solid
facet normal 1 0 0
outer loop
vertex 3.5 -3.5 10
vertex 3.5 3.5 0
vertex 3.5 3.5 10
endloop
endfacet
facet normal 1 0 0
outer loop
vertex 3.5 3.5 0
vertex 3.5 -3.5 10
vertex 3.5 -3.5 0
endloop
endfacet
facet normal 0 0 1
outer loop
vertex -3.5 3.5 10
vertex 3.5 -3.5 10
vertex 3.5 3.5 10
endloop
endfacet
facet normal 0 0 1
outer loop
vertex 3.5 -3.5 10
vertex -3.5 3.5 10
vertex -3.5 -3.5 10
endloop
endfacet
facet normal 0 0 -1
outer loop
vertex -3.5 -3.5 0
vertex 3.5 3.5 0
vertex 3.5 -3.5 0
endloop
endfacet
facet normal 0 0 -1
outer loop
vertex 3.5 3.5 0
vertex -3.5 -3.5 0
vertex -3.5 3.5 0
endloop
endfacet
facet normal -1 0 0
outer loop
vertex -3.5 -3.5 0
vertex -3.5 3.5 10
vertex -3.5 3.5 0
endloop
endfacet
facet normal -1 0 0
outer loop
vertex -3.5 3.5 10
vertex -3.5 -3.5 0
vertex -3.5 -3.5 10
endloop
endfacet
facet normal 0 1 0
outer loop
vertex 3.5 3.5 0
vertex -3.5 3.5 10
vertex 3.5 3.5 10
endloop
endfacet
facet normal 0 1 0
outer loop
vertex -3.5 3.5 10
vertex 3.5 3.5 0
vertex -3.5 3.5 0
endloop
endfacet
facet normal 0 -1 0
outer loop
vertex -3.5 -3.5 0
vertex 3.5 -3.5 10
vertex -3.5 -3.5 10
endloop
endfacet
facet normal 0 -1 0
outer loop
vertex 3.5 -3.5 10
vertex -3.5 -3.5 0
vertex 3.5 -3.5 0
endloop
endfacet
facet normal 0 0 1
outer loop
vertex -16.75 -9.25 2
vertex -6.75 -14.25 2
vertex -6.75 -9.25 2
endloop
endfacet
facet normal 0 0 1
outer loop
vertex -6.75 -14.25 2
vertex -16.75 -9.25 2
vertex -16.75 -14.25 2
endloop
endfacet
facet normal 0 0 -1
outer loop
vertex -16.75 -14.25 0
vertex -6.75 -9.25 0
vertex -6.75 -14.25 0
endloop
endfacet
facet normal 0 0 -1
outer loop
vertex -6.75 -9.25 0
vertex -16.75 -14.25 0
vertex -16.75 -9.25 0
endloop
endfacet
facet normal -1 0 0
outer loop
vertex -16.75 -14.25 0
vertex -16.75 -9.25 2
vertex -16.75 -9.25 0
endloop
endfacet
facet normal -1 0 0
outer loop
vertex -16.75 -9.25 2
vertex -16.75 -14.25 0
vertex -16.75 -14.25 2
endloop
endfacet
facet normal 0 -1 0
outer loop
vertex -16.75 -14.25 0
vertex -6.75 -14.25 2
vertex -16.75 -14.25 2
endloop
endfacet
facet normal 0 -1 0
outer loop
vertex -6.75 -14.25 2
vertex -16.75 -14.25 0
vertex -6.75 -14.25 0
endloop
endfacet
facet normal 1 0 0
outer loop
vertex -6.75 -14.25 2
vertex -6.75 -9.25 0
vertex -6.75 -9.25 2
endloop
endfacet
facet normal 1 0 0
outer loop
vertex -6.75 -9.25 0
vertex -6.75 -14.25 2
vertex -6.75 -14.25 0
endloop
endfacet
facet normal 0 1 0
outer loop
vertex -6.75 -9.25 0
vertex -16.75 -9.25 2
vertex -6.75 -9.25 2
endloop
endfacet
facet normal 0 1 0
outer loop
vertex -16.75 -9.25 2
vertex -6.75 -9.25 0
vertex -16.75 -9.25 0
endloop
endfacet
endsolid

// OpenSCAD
translate([0, 0, 5]) color([0,1,0,0.9]) cube([7, 7, 10], center=true);
translate([-16.5, -14, 1]) color([1,0,0]) cube([0.5, 0.5, 2], center=true);
translate([-16, -14, 1]) color([1,0,0]) cube([0.5, 0.5, 2], center=true);
translate([-15.5, -14, 1]) color([1,0,0]) cube([0.5, 0.5, 2], center=true);
translate([-15, -14, 1]) color([1,0,0]) cube([0.5, 0.5, 2], center=true);
translate([-14.5, -14, 1]) color([1,0,0]) cube([0.5, 0.5, 2], center=true);
translate([-14, -14, 1]) color([1,0,0]) cube([0.5, 0.5, 2], center=true);
translate([-13.5, -14, 1]) color([1,0,0]) cube([0.5, 0.5, 2], center=true);
translate([-13, -14, 1]) color([1,0,0]) cube([0.5, 0.5, 2], center=true);
translate([-12.5, -14, 1]) color([1,0,0]) cube([0.5, 0.5, 2], center=true);
translate([-12, -14, 1]) color([1,0,0]) cube([0.5, 0.5, 2], center=true);
translate([-11.5, -14, 1]) color([1,0,0]) cube([0.5, 0.5, 2], center=true);
translate([-11, -14, 1]) color([1,0,0]) cube([0.5, 0.5, 2], center=true);
translate([-10.5, -14, 1]) color([1,0,0]) cube([0.5, 0.5, 2], center=true);
translate([-10, -14, 1]) color([1,0,0]) cube([0.5, 0.5, 2], center=true);
translate([-9.5, -14, 1]) color([1,0,0]) cube([0.5, 0.5, 2], center=true);
translate([-9, -14, 1]) color([1,0,0]) cube([0.5, 0.5, 2], center=true);
translate([-8.5, -14, 1]) color([1,0,0]) cube([0.5, 0.5, 2], center=true);
translate([-8, -14, 1]) color([1,0,0]) cube([0.5, 0.5, 2], center=true);
translate([-7.5, -14, 1]) color([1,0,0]) cube([0.5, 0.5, 2], center=true);
translate([-7, -14, 1]) color([1,0,0]) cube([0.5, 0.5, 2], center=true);
translate([-16.5, -13.5, 1]) color([1,0,0]) cube([0.5, 0.5, 2], center=true);
translate([-16, -13.5, 1]) color([1,0,0]) cube([0.5, 0.5, 2], center=true);
translate([-15.5, -13.5, 1]) color([1,0,0]) cube([0.5, 0.5, 2], center=true);
translate([-15, -13.5, 1]) color([1,0,0]) cube([0.5, 0.5, 2], center=true);
translate([-14.5, -13.5, 1]) color([1,0,0]) cube([0.5, 0.5, 2], center=true);
translate([-14, -13.5, 1]) color([1,0,0]) cube([0.5, 0.5, 2], center=true);
translate([-13.5, -13.5, 1]) color([1,0,0]) cube([0.5, 0.5, 2], center=true);
translate([-13, -13.5, 1]) color([1,0,0]) cube([0.5, 0.5, 2], center=true);
translate([-12.5, -13.5, 1]) color([1,0,0]) cube([0.5, 0.5, 2], center=true);
translate([-12, -13.5, 1]) color([1,0,0]) cube([0.5, 0.5, 2], center=true);
translate([-11.5, -13.5, 1]) color([1,0,0]) cube([0.5, 0.5, 2], center=true);
translate([-11, -13.5, 1]) color([1,0,0]) cube([0.5, 0.5, 2], center=true);
translate([-10.5, -13.5, 1]) color([1,0,0]) cube([0.5, 0.5, 2], center=true);
translate([-10, -13.5, 1]) color([1,0,0]) cube([0.5, 0.5, 2], center=true);
translate([-9.5, -13.5, 1]) color([1,0,0]) cube([0.5, 0.5, 2], center=true);
translate([-9, -13.5, 1]) color([1,0,0]) cube([0.5, 0.5, 2], center=true);
translate([-8.5, -13.5, 1]) color([1,0,0]) cube([0.5, 0.5, 2], center=true);
translate([-8, -13.5, 1]) color([1,0,0]) cube([0.5, 0.5, 2], center=true);
translate([-7.5, -13.5, 1]) color([1,0,0]) cube([0.5, 0.5, 2], center=true);
translate([-7, -13.5, 1]) color([1,0,0]) cube([0.5, 0.5, 2], center=true);
translate([-16.5, -13, 1]) color([1,0,0]) cube([0.5, 0.5, 2], center=true);
translate([-16, -13, 1]) color([1,0,0]) cube([0.5, 0.5, 2], center=true);
translate([-15.5, -13, 1]) color([1,0,0]) cube([0.5, 0.5, 2], center=true);
translate([-15, -13, 1]) color([1,0,0]) cube([0.5, 0.5, 2], center=true);
translate([-14.5, -13, 1]) color([1,0,0]) cube([0.5, 0.5, 2], center=true);
translate([-14, -13, 1]) color([1,0,0]) cube([0.5, 0.5, 2], center=true);
translate([-13.5, -13, 1]) color([1,0,0]) cube([0.5, 0.5, 2], center=true);
translate([-13, -13, 1]) color([1,0,0]) cube([0.5, 0.5, 2], center=true);
translate([-12.5, -13, 1]) color([1,0,0]) cube([0.5, 0.5, 2], center=true);
translate([-12, -13, 1]) color([1,0,0]) cube([0.5, 0.5, 2], center=true);
translate([-11.5, -13, 1]) color([1,0,0]) cube([0.5, 0.5, 2], center=true);
translate([-11, -13, 1]) color([1,0,0]) cube([0.5, 0.5, 2], center=true);
translate([-10.5, -13, 1]) color([1,0,0]) cube([0.5, 0.5, 2], center=true);
translate([-10, -13, 1]) color([1,0,0]) cube([0.5, 0.5, 2], center=true);
translate([-9.5, -13, 1]) color([1,0,0]) cube([0.5, 0.5, 2], center=true);
translate([-9, -13, 1]) color([1,0,0]) cube([0.5, 0.5, 2], center=true);
translate([-8.5, -13, 1]) color([1,0,0]) cube([0.5, 0.5, 2], center=true);
translate([-8, -13, 1]) color([1,0,0]) cube([0.5, 0.5, 2], center=true);
translate([-7.5, -13, 1]) color([1,0,0]) cube([0.5, 0.5, 2], center=true);
translate([-7, -13, 1]) color([1,0,0]) cube([0.5, 0.5, 2], center=true);
translate([-16.5, -12.5, 1]) color([1,0,0]) cube([0.5, 0.5, 2], center=true);
translate([-16, -12.5, 1]) color([1,0,0]) cube([0.5, 0.5, 2], center=true);
translate([-15.5, -12.5, 1]) color([1,0,0]) cube([0.5, 0.5, 2], center=true);
translate([-15, -12.5, 1]) color([1,0,0]) cube([0.5, 0.5, 2], center=true);
translate([-14.5, -12.5, 1]) color([1,0,0]) cube([0.5, 0.5, 2], center=true);
translate([-14, -12.5, 1]) color([1,0,0]) cube([0.5, 0.5, 2], center=true);
translate([-13.5, -12.5, 1]) color([1,0,0]) cube([0.5, 0.5, 2], center=true);
translate([-13, -12.5, 1]) color([1,0,0]) cube([0.5, 0.5, 2], center=true);
translate([-12.5, -12.5, 1]) color([1,0,0]) cube([0.5, 0.5, 2], center=true);
translate([-12, -12.5, 1]) color([1,0,0]) cube([0.5, 0.5, 2], center=true);
translate([-11.5, -12.5, 1]) color([1,0,0]) cube([0.5, 0.5, 2], center=true);
translate([-11, -12.5, 1]) color([1,0,0]) cube([0.5, 0.5, 2], center=true);
translate([-10.5, -12.5, 1]) color([1,0,0]) cube([0.5, 0.5, 2], center=true);
translate([-10, -12.5, 1]) color([1,0,0]) cube([0.5, 0.5, 2], center=true);
translate([-9.5, -12.5, 1]) color([1,0,0]) cube([0.5, 0.5, 2], center=true);
translate([-9, -12.5, 1]) color([1,0,0]) cube([0.5, 0.5, 2], center=true);
translate([-8.5, -12.5, 1]) color([1,0,0]) cube([0.5, 0.5, 2], center=true);
translate([-8, -12.5, 1]) color([1,0,0]) cube([0.5, 0.5, 2], center=true);
translate([-7.5, -12.5, 1]) color([1,0,0]) cube([0.5, 0.5, 2], center=true);
translate([-7, -12.5, 1]) color([1,0,0]) cube([0.5, 0.5, 2], center=true);
translate([-16.5, -12, 1]) color([1,0,0]) cube([0.5, 0.5, 2], center=true);
translate([-16, -12, 1]) color([1,0,0]) cube([0.5, 0.5, 2], center=true);
translate([-15.5, -12, 1]) color([1,0,0]) cube([0.5, 0.5, 2], center=true);
translate([-15, -12, 1]) color([1,0,0]) cube([0.5, 0.5, 2], center=true);
translate([-14.5, -12, 1]) color([1,0,0]) cube([0.5, 0.5, 2], center=true);
translate([-14, -12, 1]) color([1,0,0]) cube([0.5, 0.5, 2], center=true);
translate([-13.5, -12, 1]) color([1,0,0]) cube([0.5, 0.5, 2], center=true);
translate([-13, -12, 1]) color([1,0,0]) cube([0.5, 0.5, 2], center=true);
translate([-12.5, -12, 1]) color([1,0,0]) cube([0.5, 0.5, 2], center=true);
translate([-12, -12, 1]) color([1,0,0]) cube([0.5, 0.5, 2], center=true);
translate([-11.5, -12, 1]) color([1,0,0]) cube([0.5, 0.5, 2], center=true);
translate([-11, -12, 1]) color([1,0,0]) cube([0.5, 0.5, 2], center=true);
translate([-10.5, -12, 1]) color([1,0,0]) cube([0.5, 0.5, 2], center=true);
translate([-10, -12, 1]) color([1,0,0]) cube([0.5, 0.5, 2], center=true);
translate([-9.5, -12, 1]) color([1,0,0]) cube([0.5, 0.5, 2], center=true);
translate([-9, -12, 1]) color([1,0,0]) cube([0.5, 0.5, 2], center=true);
translate([-8.5, -12, 1]) color([1,0,0]) cube([0.5, 0.5, 2], center=true);
translate([-8, -12, 1]) color([1,0,0]) cube([0.5, 0.5, 2], center=true);
translate([-7.5, -12, 1]) color([1,0,0]) cube([0.5, 0.5, 2], center=true);
translate([-7, -12, 1]) color([1,0,0]) cube([0.5, 0.5, 2], center=true);
translate([-16.5, -11.5, 1]) color([1,0,0]) cube([0.5, 0.5, 2], center=true);
translate([-16, -11.5, 1]) color([1,0,0]) cube([0.5, 0.5, 2], center=true);
translate([-15.5, -11.5, 1]) color([1,0,0]) cube([0.5, 0.5, 2], center=true);
translate([-15, -11.5, 1]) color([1,0,0]) cube([0.5, 0.5, 2], center=true);
translate([-14.5, -11.5, 1]) color([1,0,0]) cube([0.5, 0.5, 2], center=true);
translate([-14, -11.5, 1]) color([1,0,0]) cube([0.5, 0.5, 2], center=true);
translate([-13.5, -11.5, 1]) color([1,0,0]) cube([0.5, 0.5, 2], center=true);
translate([-13, -11.5, 1]) color([1,0,0]) cube([0.5, 0.5, 2], center=true);
translate([-12.5, -11.5, 1]) color([1,0,0]) cube([0.5, 0.5, 2], center=true);
translate([-12, -11.5, 1]) color([1,0,0]) cube([0.5, 0.5, 2], center=true);
translate([-11.5, -11.5, 1]) color([1,0,0]) cube([0.5, 0.5, 2], center=true);
translate([-11, -11.5, 1]) color([1,0,0]) cube([0.5, 0.5, 2], center=true);
translate([-10.5, -11.5, 1]) color([1,0,0]) cube([0.5, 0.5, 2], center=true);
translate([-10, -11.5, 1]) color([1,0,0]) cube([0.5, 0.5, 2], center=true);
translate([-9.5, -11.5, 1]) color([1,0,0]) cube([0.5, 0.5, 2], center=true);
translate([-9, -11.5, 1]) color([1,0,0]) cube([0.5, 0.5, 2], center=true);
translate([-8.5, -11.5, 1]) color([1,0,0]) cube([0.5, 0.5, 2], center=true);
translate([-8, -11.5, 1]) color([1,0,0]) cube([0.5, 0.5, 2], center=true);
translate([-7.5, -11.5, 1]) color([1,0,0]) cube([0.5, 0.5, 2], center=true);
translate([-7, -11.5, 1]) color([1,0,0]) cube([0.5, 0.5, 2], center=true);
translate([-16.5, -11, 1]) color([1,0,0]) cube([0.5, 0.5, 2], center=true);
translate([-16, -11, 1]) color([1,0,0]) cube([0.5, 0.5, 2], center=true);
translate([-15.5, -11, 1]) color([1,0,0]) cube([0.5, 0.5, 2], center=true);
translate([-15, -11, 1]) color([1,0,0]) cube([0.5, 0.5, 2], center=true);
translate([-14.5, -11, 1]) color([1,0,0]) cube([0.5, 0.5, 2], center=true);
translate([-14, -11, 1]) color([1,0,0]) cube([0.5, 0.5, 2], center=true);
translate([-13.5, -11, 1]) color([1,0,0]) cube([0.5, 0.5, 2], center=true);
translate([-13, -11, 1]) color([1,0,0]) cube([0.5, 0.5, 2], center=true);
translate([-12.5, -11, 1]) color([1,0,0]) cube([0.5, 0.5, 2], center=true);
translate([-12, -11, 1]) color([1,0,0]) cube([0.5, 0.5, 2], center=true);
translate([-11.5, -11, 1]) color([1,0,0]) cube([0.5, 0.5, 2], center=true);
translate([-11, -11, 1]) color([1,0,0]) cube([0.5, 0.5, 2], center=true);
translate([-10.5, -11, 1]) color([1,0,0]) cube([0.5, 0.5, 2], center=true);
translate([-10, -11, 1]) color([1,0,0]) cube([0.5, 0.5, 2], center=true);
translate([-9.5, -11, 1]) color([1,0,0]) cube([0.5, 0.5, 2], center=true);
translate([-9, -11, 1]) color([1,0,0]) cube([0.5, 0.5, 2], center=true);
translate([-8.5, -11, 1]) color([1,0,0]) cube([0.5, 0.5, 2], center=true);
translate([-8, -11, 1]) color([1,0,0]) cube([0.5, 0.5, 2], center=true);
translate([-7.5, -11, 1]) color([1,0,0]) cube([0.5, 0.5, 2], center=true);
translate([-7, -11, 1]) color([1,0,0]) cube([0.5, 0.5, 2], center=true);
translate([-16.5, -10.5, 1]) color([1,0,0]) cube([0.5, 0.5, 2], center=true);
translate([-16, -10.5, 1]) color([1,0,0]) cube([0.5, 0.5, 2], center=true);
translate([-15.5, -10.5, 1]) color([1,0,0]) cube([0.5, 0.5, 2], center=true);
translate([-15, -10.5, 1]) color([1,0,0]) cube([0.5, 0.5, 2], center=true);
translate([-14.5, -10.5, 1]) color([1,0,0]) cube([0.5, 0.5, 2], center=true);
translate([-14, -10.5, 1]) color([1,0,0]) cube([0.5, 0.5, 2], center=true);
translate([-13.5, -10.5, 1]) color([1,0,0]) cube([0.5, 0.5, 2], center=true);
translate([-13, -10.5, 1]) color([1,0,0]) cube([0.5, 0.5, 2], center=true);
translate([-12.5, -10.5, 1]) color([1,0,0]) cube([0.5, 0.5, 2], center=true);
translate([-12, -10.5, 1]) color([1,0,0]) cube([0.5, 0.5, 2], center=true);
translate([-11.5, -10.5, 1]) color([1,0,0]) cube([0.5, 0.5, 2], center=true);
translate([-11, -10.5, 1]) color([1,0,0]) cube([0.5, 0.5, 2], center=true);
translate([-10.5, -10.5, 1]) color([1,0,0]) cube([0.5, 0.5, 2], center=true);
translate([-10, -10.5, 1]) color([1,0,0]) cube([0.5, 0.5, 2], center=true);
translate([-9.5, -10.5, 1]) color([1,0,0]) cube([0.5, 0.5, 2], center=true);
translate([-9, -10.5, 1]) color([1,0,0]) cube([0.5, 0.5, 2], center=true);
translate([-8.5, -10.5, 1]) color([1,0,0]) cube([0.5, 0.5, 2], center=true);
translate([-8, -10.5, 1]) color([1,0,0]) cube([0.5, 0.5, 2], center=true);
translate([-7.5, -10.5, 1]) color([1,0,0]) cube([0.5, 0.5, 2], center=true);
translate([-7, -10.5, 1]) color([1,0,0]) cube([0.5, 0.5, 2], center=true);
translate([-16.5, -10, 1]) color([1,0,0]) cube([0.5, 0.5, 2], center=true);
translate([-16, -10, 1]) color([1,0,0]) cube([0.5, 0.5, 2], center=true);
translate([-15.5, -10, 1]) color([1,0,0]) cube([0.5, 0.5, 2], center=true);
translate([-15, -10, 1]) color([1,0,0]) cube([0.5, 0.5, 2], center=true);
translate([-14.5, -10, 1]) color([1,0,0]) cube([0.5, 0.5, 2], center=true);
translate([-14, -10, 1]) color([1,0,0]) cube([0.5, 0.5, 2], center=true);
translate([-13.5, -10, 1]) color([1,0,0]) cube([0.5, 0.5, 2], center=true);
translate([-13, -10, 1]) color([1,0,0]) cube([0.5, 0.5, 2], center=true);
translate([-12.5, -10, 1]) color([1,0,0]) cube([0.5, 0.5, 2], center=true);
translate([-12, -10, 1]) color([1,0,0]) cube([0.5, 0.5, 2], center=true);
translate([-11.5, -10, 1]) color([1,0,0]) cube([0.5, 0.5, 2], center=true);
translate([-11, -10, 1]) color([1,0,0]) cube([0.5, 0.5, 2], center=true);
translate([-10.5, -10, 1]) color([1,0,0]) cube([0.5, 0.5, 2], center=true);
translate([-10, -10, 1]) color([1,0,0]) cube([0.5, 0.5, 2], center=true);
translate([-9.5, -10, 1]) color([1,0,0]) cube([0.5, 0.5, 2], center=true);
translate([-9, -10, 1]) color([1,0,0]) cube([0.5, 0.5, 2], center=true);
translate([-8.5, -10, 1]) color([1,0,0]) cube([0.5, 0.5, 2], center=true);
translate([-8, -10, 1]) color([1,0,0]) cube([0.5, 0.5, 2], center=true);
translate([-7.5, -10, 1]) color([1,0,0]) cube([0.5, 0.5, 2], center=true);
translate([-7, -10, 1]) color([1,0,0]) cube([0.5, 0.5, 2], center=true);
translate([-16.5, -9.5, 1]) color([1,0,0]) cube([0.5, 0.5, 2], center=true);
translate([-16, -9.5, 1]) color([1,0,0]) cube([0.5, 0.5, 2], center=true);
translate([-15.5, -9.5, 1]) color([1,0,0]) cube([0.5, 0.5, 2], center=true);
translate([-15, -9.5, 1]) color([1,0,0]) cube([0.5, 0.5, 2], center=true);
translate([-14.5, -9.5, 1]) color([1,0,0]) cube([0.5, 0.5, 2], center=true);
translate([-14, -9.5, 1]) color([1,0,0]) cube([0.5, 0.5, 2], center=true);
translate([-13.5, -9.5, 1]) color([1,0,0]) cube([0.5, 0.5, 2], center=true);
translate([-13, -9.5, 1]) color([1,0,0]) cube([0.5, 0.5, 2], center=true);
translate([-12.5, -9.5, 1]) color([1,0,0]) cube([0.5, 0.5, 2], center=true);
translate([-12, -9.5, 1]) color([1,0,0]) cube([0.5, 0.5, 2], center=true);
translate([-11.5, -9.5, 1]) color([1,0,0]) cube([0.5, 0.5, 2], center=true);
translate([-11, -9.5, 1]) color([1,0,0]) cube([0.5, 0.5, 2], center=true);
translate([-10.5, -9.5, 1]) color([1,0,0]) cube([0.5, 0.5, 2], center=true);
translate([-10, -9.5, 1]) color([1,0,0]) cube([0.5, 0.5, 2], center=true);
translate([-9.5, -9.5, 1]) color([1,0,0]) cube([0.5, 0.5, 2], center=true);
translate([-9, -9.5, 1]) color([1,0,0]) cube([0.5, 0.5, 2], center=true);
translate([-8.5, -9.5, 1]) color([1,0,0]) cube([0.5, 0.5, 2], center=true);
translate([-8, -9.5, 1]) color([1,0,0]) cube([0.5, 0.5, 2], center=true);
translate([-7.5, -9.5, 1]) color([1,0,0]) cube([0.5, 0.5, 2], center=true);
translate([-7, -9.5, 1]) color([1,0,0]) cube([0.5, 0.5, 2], center=true);
